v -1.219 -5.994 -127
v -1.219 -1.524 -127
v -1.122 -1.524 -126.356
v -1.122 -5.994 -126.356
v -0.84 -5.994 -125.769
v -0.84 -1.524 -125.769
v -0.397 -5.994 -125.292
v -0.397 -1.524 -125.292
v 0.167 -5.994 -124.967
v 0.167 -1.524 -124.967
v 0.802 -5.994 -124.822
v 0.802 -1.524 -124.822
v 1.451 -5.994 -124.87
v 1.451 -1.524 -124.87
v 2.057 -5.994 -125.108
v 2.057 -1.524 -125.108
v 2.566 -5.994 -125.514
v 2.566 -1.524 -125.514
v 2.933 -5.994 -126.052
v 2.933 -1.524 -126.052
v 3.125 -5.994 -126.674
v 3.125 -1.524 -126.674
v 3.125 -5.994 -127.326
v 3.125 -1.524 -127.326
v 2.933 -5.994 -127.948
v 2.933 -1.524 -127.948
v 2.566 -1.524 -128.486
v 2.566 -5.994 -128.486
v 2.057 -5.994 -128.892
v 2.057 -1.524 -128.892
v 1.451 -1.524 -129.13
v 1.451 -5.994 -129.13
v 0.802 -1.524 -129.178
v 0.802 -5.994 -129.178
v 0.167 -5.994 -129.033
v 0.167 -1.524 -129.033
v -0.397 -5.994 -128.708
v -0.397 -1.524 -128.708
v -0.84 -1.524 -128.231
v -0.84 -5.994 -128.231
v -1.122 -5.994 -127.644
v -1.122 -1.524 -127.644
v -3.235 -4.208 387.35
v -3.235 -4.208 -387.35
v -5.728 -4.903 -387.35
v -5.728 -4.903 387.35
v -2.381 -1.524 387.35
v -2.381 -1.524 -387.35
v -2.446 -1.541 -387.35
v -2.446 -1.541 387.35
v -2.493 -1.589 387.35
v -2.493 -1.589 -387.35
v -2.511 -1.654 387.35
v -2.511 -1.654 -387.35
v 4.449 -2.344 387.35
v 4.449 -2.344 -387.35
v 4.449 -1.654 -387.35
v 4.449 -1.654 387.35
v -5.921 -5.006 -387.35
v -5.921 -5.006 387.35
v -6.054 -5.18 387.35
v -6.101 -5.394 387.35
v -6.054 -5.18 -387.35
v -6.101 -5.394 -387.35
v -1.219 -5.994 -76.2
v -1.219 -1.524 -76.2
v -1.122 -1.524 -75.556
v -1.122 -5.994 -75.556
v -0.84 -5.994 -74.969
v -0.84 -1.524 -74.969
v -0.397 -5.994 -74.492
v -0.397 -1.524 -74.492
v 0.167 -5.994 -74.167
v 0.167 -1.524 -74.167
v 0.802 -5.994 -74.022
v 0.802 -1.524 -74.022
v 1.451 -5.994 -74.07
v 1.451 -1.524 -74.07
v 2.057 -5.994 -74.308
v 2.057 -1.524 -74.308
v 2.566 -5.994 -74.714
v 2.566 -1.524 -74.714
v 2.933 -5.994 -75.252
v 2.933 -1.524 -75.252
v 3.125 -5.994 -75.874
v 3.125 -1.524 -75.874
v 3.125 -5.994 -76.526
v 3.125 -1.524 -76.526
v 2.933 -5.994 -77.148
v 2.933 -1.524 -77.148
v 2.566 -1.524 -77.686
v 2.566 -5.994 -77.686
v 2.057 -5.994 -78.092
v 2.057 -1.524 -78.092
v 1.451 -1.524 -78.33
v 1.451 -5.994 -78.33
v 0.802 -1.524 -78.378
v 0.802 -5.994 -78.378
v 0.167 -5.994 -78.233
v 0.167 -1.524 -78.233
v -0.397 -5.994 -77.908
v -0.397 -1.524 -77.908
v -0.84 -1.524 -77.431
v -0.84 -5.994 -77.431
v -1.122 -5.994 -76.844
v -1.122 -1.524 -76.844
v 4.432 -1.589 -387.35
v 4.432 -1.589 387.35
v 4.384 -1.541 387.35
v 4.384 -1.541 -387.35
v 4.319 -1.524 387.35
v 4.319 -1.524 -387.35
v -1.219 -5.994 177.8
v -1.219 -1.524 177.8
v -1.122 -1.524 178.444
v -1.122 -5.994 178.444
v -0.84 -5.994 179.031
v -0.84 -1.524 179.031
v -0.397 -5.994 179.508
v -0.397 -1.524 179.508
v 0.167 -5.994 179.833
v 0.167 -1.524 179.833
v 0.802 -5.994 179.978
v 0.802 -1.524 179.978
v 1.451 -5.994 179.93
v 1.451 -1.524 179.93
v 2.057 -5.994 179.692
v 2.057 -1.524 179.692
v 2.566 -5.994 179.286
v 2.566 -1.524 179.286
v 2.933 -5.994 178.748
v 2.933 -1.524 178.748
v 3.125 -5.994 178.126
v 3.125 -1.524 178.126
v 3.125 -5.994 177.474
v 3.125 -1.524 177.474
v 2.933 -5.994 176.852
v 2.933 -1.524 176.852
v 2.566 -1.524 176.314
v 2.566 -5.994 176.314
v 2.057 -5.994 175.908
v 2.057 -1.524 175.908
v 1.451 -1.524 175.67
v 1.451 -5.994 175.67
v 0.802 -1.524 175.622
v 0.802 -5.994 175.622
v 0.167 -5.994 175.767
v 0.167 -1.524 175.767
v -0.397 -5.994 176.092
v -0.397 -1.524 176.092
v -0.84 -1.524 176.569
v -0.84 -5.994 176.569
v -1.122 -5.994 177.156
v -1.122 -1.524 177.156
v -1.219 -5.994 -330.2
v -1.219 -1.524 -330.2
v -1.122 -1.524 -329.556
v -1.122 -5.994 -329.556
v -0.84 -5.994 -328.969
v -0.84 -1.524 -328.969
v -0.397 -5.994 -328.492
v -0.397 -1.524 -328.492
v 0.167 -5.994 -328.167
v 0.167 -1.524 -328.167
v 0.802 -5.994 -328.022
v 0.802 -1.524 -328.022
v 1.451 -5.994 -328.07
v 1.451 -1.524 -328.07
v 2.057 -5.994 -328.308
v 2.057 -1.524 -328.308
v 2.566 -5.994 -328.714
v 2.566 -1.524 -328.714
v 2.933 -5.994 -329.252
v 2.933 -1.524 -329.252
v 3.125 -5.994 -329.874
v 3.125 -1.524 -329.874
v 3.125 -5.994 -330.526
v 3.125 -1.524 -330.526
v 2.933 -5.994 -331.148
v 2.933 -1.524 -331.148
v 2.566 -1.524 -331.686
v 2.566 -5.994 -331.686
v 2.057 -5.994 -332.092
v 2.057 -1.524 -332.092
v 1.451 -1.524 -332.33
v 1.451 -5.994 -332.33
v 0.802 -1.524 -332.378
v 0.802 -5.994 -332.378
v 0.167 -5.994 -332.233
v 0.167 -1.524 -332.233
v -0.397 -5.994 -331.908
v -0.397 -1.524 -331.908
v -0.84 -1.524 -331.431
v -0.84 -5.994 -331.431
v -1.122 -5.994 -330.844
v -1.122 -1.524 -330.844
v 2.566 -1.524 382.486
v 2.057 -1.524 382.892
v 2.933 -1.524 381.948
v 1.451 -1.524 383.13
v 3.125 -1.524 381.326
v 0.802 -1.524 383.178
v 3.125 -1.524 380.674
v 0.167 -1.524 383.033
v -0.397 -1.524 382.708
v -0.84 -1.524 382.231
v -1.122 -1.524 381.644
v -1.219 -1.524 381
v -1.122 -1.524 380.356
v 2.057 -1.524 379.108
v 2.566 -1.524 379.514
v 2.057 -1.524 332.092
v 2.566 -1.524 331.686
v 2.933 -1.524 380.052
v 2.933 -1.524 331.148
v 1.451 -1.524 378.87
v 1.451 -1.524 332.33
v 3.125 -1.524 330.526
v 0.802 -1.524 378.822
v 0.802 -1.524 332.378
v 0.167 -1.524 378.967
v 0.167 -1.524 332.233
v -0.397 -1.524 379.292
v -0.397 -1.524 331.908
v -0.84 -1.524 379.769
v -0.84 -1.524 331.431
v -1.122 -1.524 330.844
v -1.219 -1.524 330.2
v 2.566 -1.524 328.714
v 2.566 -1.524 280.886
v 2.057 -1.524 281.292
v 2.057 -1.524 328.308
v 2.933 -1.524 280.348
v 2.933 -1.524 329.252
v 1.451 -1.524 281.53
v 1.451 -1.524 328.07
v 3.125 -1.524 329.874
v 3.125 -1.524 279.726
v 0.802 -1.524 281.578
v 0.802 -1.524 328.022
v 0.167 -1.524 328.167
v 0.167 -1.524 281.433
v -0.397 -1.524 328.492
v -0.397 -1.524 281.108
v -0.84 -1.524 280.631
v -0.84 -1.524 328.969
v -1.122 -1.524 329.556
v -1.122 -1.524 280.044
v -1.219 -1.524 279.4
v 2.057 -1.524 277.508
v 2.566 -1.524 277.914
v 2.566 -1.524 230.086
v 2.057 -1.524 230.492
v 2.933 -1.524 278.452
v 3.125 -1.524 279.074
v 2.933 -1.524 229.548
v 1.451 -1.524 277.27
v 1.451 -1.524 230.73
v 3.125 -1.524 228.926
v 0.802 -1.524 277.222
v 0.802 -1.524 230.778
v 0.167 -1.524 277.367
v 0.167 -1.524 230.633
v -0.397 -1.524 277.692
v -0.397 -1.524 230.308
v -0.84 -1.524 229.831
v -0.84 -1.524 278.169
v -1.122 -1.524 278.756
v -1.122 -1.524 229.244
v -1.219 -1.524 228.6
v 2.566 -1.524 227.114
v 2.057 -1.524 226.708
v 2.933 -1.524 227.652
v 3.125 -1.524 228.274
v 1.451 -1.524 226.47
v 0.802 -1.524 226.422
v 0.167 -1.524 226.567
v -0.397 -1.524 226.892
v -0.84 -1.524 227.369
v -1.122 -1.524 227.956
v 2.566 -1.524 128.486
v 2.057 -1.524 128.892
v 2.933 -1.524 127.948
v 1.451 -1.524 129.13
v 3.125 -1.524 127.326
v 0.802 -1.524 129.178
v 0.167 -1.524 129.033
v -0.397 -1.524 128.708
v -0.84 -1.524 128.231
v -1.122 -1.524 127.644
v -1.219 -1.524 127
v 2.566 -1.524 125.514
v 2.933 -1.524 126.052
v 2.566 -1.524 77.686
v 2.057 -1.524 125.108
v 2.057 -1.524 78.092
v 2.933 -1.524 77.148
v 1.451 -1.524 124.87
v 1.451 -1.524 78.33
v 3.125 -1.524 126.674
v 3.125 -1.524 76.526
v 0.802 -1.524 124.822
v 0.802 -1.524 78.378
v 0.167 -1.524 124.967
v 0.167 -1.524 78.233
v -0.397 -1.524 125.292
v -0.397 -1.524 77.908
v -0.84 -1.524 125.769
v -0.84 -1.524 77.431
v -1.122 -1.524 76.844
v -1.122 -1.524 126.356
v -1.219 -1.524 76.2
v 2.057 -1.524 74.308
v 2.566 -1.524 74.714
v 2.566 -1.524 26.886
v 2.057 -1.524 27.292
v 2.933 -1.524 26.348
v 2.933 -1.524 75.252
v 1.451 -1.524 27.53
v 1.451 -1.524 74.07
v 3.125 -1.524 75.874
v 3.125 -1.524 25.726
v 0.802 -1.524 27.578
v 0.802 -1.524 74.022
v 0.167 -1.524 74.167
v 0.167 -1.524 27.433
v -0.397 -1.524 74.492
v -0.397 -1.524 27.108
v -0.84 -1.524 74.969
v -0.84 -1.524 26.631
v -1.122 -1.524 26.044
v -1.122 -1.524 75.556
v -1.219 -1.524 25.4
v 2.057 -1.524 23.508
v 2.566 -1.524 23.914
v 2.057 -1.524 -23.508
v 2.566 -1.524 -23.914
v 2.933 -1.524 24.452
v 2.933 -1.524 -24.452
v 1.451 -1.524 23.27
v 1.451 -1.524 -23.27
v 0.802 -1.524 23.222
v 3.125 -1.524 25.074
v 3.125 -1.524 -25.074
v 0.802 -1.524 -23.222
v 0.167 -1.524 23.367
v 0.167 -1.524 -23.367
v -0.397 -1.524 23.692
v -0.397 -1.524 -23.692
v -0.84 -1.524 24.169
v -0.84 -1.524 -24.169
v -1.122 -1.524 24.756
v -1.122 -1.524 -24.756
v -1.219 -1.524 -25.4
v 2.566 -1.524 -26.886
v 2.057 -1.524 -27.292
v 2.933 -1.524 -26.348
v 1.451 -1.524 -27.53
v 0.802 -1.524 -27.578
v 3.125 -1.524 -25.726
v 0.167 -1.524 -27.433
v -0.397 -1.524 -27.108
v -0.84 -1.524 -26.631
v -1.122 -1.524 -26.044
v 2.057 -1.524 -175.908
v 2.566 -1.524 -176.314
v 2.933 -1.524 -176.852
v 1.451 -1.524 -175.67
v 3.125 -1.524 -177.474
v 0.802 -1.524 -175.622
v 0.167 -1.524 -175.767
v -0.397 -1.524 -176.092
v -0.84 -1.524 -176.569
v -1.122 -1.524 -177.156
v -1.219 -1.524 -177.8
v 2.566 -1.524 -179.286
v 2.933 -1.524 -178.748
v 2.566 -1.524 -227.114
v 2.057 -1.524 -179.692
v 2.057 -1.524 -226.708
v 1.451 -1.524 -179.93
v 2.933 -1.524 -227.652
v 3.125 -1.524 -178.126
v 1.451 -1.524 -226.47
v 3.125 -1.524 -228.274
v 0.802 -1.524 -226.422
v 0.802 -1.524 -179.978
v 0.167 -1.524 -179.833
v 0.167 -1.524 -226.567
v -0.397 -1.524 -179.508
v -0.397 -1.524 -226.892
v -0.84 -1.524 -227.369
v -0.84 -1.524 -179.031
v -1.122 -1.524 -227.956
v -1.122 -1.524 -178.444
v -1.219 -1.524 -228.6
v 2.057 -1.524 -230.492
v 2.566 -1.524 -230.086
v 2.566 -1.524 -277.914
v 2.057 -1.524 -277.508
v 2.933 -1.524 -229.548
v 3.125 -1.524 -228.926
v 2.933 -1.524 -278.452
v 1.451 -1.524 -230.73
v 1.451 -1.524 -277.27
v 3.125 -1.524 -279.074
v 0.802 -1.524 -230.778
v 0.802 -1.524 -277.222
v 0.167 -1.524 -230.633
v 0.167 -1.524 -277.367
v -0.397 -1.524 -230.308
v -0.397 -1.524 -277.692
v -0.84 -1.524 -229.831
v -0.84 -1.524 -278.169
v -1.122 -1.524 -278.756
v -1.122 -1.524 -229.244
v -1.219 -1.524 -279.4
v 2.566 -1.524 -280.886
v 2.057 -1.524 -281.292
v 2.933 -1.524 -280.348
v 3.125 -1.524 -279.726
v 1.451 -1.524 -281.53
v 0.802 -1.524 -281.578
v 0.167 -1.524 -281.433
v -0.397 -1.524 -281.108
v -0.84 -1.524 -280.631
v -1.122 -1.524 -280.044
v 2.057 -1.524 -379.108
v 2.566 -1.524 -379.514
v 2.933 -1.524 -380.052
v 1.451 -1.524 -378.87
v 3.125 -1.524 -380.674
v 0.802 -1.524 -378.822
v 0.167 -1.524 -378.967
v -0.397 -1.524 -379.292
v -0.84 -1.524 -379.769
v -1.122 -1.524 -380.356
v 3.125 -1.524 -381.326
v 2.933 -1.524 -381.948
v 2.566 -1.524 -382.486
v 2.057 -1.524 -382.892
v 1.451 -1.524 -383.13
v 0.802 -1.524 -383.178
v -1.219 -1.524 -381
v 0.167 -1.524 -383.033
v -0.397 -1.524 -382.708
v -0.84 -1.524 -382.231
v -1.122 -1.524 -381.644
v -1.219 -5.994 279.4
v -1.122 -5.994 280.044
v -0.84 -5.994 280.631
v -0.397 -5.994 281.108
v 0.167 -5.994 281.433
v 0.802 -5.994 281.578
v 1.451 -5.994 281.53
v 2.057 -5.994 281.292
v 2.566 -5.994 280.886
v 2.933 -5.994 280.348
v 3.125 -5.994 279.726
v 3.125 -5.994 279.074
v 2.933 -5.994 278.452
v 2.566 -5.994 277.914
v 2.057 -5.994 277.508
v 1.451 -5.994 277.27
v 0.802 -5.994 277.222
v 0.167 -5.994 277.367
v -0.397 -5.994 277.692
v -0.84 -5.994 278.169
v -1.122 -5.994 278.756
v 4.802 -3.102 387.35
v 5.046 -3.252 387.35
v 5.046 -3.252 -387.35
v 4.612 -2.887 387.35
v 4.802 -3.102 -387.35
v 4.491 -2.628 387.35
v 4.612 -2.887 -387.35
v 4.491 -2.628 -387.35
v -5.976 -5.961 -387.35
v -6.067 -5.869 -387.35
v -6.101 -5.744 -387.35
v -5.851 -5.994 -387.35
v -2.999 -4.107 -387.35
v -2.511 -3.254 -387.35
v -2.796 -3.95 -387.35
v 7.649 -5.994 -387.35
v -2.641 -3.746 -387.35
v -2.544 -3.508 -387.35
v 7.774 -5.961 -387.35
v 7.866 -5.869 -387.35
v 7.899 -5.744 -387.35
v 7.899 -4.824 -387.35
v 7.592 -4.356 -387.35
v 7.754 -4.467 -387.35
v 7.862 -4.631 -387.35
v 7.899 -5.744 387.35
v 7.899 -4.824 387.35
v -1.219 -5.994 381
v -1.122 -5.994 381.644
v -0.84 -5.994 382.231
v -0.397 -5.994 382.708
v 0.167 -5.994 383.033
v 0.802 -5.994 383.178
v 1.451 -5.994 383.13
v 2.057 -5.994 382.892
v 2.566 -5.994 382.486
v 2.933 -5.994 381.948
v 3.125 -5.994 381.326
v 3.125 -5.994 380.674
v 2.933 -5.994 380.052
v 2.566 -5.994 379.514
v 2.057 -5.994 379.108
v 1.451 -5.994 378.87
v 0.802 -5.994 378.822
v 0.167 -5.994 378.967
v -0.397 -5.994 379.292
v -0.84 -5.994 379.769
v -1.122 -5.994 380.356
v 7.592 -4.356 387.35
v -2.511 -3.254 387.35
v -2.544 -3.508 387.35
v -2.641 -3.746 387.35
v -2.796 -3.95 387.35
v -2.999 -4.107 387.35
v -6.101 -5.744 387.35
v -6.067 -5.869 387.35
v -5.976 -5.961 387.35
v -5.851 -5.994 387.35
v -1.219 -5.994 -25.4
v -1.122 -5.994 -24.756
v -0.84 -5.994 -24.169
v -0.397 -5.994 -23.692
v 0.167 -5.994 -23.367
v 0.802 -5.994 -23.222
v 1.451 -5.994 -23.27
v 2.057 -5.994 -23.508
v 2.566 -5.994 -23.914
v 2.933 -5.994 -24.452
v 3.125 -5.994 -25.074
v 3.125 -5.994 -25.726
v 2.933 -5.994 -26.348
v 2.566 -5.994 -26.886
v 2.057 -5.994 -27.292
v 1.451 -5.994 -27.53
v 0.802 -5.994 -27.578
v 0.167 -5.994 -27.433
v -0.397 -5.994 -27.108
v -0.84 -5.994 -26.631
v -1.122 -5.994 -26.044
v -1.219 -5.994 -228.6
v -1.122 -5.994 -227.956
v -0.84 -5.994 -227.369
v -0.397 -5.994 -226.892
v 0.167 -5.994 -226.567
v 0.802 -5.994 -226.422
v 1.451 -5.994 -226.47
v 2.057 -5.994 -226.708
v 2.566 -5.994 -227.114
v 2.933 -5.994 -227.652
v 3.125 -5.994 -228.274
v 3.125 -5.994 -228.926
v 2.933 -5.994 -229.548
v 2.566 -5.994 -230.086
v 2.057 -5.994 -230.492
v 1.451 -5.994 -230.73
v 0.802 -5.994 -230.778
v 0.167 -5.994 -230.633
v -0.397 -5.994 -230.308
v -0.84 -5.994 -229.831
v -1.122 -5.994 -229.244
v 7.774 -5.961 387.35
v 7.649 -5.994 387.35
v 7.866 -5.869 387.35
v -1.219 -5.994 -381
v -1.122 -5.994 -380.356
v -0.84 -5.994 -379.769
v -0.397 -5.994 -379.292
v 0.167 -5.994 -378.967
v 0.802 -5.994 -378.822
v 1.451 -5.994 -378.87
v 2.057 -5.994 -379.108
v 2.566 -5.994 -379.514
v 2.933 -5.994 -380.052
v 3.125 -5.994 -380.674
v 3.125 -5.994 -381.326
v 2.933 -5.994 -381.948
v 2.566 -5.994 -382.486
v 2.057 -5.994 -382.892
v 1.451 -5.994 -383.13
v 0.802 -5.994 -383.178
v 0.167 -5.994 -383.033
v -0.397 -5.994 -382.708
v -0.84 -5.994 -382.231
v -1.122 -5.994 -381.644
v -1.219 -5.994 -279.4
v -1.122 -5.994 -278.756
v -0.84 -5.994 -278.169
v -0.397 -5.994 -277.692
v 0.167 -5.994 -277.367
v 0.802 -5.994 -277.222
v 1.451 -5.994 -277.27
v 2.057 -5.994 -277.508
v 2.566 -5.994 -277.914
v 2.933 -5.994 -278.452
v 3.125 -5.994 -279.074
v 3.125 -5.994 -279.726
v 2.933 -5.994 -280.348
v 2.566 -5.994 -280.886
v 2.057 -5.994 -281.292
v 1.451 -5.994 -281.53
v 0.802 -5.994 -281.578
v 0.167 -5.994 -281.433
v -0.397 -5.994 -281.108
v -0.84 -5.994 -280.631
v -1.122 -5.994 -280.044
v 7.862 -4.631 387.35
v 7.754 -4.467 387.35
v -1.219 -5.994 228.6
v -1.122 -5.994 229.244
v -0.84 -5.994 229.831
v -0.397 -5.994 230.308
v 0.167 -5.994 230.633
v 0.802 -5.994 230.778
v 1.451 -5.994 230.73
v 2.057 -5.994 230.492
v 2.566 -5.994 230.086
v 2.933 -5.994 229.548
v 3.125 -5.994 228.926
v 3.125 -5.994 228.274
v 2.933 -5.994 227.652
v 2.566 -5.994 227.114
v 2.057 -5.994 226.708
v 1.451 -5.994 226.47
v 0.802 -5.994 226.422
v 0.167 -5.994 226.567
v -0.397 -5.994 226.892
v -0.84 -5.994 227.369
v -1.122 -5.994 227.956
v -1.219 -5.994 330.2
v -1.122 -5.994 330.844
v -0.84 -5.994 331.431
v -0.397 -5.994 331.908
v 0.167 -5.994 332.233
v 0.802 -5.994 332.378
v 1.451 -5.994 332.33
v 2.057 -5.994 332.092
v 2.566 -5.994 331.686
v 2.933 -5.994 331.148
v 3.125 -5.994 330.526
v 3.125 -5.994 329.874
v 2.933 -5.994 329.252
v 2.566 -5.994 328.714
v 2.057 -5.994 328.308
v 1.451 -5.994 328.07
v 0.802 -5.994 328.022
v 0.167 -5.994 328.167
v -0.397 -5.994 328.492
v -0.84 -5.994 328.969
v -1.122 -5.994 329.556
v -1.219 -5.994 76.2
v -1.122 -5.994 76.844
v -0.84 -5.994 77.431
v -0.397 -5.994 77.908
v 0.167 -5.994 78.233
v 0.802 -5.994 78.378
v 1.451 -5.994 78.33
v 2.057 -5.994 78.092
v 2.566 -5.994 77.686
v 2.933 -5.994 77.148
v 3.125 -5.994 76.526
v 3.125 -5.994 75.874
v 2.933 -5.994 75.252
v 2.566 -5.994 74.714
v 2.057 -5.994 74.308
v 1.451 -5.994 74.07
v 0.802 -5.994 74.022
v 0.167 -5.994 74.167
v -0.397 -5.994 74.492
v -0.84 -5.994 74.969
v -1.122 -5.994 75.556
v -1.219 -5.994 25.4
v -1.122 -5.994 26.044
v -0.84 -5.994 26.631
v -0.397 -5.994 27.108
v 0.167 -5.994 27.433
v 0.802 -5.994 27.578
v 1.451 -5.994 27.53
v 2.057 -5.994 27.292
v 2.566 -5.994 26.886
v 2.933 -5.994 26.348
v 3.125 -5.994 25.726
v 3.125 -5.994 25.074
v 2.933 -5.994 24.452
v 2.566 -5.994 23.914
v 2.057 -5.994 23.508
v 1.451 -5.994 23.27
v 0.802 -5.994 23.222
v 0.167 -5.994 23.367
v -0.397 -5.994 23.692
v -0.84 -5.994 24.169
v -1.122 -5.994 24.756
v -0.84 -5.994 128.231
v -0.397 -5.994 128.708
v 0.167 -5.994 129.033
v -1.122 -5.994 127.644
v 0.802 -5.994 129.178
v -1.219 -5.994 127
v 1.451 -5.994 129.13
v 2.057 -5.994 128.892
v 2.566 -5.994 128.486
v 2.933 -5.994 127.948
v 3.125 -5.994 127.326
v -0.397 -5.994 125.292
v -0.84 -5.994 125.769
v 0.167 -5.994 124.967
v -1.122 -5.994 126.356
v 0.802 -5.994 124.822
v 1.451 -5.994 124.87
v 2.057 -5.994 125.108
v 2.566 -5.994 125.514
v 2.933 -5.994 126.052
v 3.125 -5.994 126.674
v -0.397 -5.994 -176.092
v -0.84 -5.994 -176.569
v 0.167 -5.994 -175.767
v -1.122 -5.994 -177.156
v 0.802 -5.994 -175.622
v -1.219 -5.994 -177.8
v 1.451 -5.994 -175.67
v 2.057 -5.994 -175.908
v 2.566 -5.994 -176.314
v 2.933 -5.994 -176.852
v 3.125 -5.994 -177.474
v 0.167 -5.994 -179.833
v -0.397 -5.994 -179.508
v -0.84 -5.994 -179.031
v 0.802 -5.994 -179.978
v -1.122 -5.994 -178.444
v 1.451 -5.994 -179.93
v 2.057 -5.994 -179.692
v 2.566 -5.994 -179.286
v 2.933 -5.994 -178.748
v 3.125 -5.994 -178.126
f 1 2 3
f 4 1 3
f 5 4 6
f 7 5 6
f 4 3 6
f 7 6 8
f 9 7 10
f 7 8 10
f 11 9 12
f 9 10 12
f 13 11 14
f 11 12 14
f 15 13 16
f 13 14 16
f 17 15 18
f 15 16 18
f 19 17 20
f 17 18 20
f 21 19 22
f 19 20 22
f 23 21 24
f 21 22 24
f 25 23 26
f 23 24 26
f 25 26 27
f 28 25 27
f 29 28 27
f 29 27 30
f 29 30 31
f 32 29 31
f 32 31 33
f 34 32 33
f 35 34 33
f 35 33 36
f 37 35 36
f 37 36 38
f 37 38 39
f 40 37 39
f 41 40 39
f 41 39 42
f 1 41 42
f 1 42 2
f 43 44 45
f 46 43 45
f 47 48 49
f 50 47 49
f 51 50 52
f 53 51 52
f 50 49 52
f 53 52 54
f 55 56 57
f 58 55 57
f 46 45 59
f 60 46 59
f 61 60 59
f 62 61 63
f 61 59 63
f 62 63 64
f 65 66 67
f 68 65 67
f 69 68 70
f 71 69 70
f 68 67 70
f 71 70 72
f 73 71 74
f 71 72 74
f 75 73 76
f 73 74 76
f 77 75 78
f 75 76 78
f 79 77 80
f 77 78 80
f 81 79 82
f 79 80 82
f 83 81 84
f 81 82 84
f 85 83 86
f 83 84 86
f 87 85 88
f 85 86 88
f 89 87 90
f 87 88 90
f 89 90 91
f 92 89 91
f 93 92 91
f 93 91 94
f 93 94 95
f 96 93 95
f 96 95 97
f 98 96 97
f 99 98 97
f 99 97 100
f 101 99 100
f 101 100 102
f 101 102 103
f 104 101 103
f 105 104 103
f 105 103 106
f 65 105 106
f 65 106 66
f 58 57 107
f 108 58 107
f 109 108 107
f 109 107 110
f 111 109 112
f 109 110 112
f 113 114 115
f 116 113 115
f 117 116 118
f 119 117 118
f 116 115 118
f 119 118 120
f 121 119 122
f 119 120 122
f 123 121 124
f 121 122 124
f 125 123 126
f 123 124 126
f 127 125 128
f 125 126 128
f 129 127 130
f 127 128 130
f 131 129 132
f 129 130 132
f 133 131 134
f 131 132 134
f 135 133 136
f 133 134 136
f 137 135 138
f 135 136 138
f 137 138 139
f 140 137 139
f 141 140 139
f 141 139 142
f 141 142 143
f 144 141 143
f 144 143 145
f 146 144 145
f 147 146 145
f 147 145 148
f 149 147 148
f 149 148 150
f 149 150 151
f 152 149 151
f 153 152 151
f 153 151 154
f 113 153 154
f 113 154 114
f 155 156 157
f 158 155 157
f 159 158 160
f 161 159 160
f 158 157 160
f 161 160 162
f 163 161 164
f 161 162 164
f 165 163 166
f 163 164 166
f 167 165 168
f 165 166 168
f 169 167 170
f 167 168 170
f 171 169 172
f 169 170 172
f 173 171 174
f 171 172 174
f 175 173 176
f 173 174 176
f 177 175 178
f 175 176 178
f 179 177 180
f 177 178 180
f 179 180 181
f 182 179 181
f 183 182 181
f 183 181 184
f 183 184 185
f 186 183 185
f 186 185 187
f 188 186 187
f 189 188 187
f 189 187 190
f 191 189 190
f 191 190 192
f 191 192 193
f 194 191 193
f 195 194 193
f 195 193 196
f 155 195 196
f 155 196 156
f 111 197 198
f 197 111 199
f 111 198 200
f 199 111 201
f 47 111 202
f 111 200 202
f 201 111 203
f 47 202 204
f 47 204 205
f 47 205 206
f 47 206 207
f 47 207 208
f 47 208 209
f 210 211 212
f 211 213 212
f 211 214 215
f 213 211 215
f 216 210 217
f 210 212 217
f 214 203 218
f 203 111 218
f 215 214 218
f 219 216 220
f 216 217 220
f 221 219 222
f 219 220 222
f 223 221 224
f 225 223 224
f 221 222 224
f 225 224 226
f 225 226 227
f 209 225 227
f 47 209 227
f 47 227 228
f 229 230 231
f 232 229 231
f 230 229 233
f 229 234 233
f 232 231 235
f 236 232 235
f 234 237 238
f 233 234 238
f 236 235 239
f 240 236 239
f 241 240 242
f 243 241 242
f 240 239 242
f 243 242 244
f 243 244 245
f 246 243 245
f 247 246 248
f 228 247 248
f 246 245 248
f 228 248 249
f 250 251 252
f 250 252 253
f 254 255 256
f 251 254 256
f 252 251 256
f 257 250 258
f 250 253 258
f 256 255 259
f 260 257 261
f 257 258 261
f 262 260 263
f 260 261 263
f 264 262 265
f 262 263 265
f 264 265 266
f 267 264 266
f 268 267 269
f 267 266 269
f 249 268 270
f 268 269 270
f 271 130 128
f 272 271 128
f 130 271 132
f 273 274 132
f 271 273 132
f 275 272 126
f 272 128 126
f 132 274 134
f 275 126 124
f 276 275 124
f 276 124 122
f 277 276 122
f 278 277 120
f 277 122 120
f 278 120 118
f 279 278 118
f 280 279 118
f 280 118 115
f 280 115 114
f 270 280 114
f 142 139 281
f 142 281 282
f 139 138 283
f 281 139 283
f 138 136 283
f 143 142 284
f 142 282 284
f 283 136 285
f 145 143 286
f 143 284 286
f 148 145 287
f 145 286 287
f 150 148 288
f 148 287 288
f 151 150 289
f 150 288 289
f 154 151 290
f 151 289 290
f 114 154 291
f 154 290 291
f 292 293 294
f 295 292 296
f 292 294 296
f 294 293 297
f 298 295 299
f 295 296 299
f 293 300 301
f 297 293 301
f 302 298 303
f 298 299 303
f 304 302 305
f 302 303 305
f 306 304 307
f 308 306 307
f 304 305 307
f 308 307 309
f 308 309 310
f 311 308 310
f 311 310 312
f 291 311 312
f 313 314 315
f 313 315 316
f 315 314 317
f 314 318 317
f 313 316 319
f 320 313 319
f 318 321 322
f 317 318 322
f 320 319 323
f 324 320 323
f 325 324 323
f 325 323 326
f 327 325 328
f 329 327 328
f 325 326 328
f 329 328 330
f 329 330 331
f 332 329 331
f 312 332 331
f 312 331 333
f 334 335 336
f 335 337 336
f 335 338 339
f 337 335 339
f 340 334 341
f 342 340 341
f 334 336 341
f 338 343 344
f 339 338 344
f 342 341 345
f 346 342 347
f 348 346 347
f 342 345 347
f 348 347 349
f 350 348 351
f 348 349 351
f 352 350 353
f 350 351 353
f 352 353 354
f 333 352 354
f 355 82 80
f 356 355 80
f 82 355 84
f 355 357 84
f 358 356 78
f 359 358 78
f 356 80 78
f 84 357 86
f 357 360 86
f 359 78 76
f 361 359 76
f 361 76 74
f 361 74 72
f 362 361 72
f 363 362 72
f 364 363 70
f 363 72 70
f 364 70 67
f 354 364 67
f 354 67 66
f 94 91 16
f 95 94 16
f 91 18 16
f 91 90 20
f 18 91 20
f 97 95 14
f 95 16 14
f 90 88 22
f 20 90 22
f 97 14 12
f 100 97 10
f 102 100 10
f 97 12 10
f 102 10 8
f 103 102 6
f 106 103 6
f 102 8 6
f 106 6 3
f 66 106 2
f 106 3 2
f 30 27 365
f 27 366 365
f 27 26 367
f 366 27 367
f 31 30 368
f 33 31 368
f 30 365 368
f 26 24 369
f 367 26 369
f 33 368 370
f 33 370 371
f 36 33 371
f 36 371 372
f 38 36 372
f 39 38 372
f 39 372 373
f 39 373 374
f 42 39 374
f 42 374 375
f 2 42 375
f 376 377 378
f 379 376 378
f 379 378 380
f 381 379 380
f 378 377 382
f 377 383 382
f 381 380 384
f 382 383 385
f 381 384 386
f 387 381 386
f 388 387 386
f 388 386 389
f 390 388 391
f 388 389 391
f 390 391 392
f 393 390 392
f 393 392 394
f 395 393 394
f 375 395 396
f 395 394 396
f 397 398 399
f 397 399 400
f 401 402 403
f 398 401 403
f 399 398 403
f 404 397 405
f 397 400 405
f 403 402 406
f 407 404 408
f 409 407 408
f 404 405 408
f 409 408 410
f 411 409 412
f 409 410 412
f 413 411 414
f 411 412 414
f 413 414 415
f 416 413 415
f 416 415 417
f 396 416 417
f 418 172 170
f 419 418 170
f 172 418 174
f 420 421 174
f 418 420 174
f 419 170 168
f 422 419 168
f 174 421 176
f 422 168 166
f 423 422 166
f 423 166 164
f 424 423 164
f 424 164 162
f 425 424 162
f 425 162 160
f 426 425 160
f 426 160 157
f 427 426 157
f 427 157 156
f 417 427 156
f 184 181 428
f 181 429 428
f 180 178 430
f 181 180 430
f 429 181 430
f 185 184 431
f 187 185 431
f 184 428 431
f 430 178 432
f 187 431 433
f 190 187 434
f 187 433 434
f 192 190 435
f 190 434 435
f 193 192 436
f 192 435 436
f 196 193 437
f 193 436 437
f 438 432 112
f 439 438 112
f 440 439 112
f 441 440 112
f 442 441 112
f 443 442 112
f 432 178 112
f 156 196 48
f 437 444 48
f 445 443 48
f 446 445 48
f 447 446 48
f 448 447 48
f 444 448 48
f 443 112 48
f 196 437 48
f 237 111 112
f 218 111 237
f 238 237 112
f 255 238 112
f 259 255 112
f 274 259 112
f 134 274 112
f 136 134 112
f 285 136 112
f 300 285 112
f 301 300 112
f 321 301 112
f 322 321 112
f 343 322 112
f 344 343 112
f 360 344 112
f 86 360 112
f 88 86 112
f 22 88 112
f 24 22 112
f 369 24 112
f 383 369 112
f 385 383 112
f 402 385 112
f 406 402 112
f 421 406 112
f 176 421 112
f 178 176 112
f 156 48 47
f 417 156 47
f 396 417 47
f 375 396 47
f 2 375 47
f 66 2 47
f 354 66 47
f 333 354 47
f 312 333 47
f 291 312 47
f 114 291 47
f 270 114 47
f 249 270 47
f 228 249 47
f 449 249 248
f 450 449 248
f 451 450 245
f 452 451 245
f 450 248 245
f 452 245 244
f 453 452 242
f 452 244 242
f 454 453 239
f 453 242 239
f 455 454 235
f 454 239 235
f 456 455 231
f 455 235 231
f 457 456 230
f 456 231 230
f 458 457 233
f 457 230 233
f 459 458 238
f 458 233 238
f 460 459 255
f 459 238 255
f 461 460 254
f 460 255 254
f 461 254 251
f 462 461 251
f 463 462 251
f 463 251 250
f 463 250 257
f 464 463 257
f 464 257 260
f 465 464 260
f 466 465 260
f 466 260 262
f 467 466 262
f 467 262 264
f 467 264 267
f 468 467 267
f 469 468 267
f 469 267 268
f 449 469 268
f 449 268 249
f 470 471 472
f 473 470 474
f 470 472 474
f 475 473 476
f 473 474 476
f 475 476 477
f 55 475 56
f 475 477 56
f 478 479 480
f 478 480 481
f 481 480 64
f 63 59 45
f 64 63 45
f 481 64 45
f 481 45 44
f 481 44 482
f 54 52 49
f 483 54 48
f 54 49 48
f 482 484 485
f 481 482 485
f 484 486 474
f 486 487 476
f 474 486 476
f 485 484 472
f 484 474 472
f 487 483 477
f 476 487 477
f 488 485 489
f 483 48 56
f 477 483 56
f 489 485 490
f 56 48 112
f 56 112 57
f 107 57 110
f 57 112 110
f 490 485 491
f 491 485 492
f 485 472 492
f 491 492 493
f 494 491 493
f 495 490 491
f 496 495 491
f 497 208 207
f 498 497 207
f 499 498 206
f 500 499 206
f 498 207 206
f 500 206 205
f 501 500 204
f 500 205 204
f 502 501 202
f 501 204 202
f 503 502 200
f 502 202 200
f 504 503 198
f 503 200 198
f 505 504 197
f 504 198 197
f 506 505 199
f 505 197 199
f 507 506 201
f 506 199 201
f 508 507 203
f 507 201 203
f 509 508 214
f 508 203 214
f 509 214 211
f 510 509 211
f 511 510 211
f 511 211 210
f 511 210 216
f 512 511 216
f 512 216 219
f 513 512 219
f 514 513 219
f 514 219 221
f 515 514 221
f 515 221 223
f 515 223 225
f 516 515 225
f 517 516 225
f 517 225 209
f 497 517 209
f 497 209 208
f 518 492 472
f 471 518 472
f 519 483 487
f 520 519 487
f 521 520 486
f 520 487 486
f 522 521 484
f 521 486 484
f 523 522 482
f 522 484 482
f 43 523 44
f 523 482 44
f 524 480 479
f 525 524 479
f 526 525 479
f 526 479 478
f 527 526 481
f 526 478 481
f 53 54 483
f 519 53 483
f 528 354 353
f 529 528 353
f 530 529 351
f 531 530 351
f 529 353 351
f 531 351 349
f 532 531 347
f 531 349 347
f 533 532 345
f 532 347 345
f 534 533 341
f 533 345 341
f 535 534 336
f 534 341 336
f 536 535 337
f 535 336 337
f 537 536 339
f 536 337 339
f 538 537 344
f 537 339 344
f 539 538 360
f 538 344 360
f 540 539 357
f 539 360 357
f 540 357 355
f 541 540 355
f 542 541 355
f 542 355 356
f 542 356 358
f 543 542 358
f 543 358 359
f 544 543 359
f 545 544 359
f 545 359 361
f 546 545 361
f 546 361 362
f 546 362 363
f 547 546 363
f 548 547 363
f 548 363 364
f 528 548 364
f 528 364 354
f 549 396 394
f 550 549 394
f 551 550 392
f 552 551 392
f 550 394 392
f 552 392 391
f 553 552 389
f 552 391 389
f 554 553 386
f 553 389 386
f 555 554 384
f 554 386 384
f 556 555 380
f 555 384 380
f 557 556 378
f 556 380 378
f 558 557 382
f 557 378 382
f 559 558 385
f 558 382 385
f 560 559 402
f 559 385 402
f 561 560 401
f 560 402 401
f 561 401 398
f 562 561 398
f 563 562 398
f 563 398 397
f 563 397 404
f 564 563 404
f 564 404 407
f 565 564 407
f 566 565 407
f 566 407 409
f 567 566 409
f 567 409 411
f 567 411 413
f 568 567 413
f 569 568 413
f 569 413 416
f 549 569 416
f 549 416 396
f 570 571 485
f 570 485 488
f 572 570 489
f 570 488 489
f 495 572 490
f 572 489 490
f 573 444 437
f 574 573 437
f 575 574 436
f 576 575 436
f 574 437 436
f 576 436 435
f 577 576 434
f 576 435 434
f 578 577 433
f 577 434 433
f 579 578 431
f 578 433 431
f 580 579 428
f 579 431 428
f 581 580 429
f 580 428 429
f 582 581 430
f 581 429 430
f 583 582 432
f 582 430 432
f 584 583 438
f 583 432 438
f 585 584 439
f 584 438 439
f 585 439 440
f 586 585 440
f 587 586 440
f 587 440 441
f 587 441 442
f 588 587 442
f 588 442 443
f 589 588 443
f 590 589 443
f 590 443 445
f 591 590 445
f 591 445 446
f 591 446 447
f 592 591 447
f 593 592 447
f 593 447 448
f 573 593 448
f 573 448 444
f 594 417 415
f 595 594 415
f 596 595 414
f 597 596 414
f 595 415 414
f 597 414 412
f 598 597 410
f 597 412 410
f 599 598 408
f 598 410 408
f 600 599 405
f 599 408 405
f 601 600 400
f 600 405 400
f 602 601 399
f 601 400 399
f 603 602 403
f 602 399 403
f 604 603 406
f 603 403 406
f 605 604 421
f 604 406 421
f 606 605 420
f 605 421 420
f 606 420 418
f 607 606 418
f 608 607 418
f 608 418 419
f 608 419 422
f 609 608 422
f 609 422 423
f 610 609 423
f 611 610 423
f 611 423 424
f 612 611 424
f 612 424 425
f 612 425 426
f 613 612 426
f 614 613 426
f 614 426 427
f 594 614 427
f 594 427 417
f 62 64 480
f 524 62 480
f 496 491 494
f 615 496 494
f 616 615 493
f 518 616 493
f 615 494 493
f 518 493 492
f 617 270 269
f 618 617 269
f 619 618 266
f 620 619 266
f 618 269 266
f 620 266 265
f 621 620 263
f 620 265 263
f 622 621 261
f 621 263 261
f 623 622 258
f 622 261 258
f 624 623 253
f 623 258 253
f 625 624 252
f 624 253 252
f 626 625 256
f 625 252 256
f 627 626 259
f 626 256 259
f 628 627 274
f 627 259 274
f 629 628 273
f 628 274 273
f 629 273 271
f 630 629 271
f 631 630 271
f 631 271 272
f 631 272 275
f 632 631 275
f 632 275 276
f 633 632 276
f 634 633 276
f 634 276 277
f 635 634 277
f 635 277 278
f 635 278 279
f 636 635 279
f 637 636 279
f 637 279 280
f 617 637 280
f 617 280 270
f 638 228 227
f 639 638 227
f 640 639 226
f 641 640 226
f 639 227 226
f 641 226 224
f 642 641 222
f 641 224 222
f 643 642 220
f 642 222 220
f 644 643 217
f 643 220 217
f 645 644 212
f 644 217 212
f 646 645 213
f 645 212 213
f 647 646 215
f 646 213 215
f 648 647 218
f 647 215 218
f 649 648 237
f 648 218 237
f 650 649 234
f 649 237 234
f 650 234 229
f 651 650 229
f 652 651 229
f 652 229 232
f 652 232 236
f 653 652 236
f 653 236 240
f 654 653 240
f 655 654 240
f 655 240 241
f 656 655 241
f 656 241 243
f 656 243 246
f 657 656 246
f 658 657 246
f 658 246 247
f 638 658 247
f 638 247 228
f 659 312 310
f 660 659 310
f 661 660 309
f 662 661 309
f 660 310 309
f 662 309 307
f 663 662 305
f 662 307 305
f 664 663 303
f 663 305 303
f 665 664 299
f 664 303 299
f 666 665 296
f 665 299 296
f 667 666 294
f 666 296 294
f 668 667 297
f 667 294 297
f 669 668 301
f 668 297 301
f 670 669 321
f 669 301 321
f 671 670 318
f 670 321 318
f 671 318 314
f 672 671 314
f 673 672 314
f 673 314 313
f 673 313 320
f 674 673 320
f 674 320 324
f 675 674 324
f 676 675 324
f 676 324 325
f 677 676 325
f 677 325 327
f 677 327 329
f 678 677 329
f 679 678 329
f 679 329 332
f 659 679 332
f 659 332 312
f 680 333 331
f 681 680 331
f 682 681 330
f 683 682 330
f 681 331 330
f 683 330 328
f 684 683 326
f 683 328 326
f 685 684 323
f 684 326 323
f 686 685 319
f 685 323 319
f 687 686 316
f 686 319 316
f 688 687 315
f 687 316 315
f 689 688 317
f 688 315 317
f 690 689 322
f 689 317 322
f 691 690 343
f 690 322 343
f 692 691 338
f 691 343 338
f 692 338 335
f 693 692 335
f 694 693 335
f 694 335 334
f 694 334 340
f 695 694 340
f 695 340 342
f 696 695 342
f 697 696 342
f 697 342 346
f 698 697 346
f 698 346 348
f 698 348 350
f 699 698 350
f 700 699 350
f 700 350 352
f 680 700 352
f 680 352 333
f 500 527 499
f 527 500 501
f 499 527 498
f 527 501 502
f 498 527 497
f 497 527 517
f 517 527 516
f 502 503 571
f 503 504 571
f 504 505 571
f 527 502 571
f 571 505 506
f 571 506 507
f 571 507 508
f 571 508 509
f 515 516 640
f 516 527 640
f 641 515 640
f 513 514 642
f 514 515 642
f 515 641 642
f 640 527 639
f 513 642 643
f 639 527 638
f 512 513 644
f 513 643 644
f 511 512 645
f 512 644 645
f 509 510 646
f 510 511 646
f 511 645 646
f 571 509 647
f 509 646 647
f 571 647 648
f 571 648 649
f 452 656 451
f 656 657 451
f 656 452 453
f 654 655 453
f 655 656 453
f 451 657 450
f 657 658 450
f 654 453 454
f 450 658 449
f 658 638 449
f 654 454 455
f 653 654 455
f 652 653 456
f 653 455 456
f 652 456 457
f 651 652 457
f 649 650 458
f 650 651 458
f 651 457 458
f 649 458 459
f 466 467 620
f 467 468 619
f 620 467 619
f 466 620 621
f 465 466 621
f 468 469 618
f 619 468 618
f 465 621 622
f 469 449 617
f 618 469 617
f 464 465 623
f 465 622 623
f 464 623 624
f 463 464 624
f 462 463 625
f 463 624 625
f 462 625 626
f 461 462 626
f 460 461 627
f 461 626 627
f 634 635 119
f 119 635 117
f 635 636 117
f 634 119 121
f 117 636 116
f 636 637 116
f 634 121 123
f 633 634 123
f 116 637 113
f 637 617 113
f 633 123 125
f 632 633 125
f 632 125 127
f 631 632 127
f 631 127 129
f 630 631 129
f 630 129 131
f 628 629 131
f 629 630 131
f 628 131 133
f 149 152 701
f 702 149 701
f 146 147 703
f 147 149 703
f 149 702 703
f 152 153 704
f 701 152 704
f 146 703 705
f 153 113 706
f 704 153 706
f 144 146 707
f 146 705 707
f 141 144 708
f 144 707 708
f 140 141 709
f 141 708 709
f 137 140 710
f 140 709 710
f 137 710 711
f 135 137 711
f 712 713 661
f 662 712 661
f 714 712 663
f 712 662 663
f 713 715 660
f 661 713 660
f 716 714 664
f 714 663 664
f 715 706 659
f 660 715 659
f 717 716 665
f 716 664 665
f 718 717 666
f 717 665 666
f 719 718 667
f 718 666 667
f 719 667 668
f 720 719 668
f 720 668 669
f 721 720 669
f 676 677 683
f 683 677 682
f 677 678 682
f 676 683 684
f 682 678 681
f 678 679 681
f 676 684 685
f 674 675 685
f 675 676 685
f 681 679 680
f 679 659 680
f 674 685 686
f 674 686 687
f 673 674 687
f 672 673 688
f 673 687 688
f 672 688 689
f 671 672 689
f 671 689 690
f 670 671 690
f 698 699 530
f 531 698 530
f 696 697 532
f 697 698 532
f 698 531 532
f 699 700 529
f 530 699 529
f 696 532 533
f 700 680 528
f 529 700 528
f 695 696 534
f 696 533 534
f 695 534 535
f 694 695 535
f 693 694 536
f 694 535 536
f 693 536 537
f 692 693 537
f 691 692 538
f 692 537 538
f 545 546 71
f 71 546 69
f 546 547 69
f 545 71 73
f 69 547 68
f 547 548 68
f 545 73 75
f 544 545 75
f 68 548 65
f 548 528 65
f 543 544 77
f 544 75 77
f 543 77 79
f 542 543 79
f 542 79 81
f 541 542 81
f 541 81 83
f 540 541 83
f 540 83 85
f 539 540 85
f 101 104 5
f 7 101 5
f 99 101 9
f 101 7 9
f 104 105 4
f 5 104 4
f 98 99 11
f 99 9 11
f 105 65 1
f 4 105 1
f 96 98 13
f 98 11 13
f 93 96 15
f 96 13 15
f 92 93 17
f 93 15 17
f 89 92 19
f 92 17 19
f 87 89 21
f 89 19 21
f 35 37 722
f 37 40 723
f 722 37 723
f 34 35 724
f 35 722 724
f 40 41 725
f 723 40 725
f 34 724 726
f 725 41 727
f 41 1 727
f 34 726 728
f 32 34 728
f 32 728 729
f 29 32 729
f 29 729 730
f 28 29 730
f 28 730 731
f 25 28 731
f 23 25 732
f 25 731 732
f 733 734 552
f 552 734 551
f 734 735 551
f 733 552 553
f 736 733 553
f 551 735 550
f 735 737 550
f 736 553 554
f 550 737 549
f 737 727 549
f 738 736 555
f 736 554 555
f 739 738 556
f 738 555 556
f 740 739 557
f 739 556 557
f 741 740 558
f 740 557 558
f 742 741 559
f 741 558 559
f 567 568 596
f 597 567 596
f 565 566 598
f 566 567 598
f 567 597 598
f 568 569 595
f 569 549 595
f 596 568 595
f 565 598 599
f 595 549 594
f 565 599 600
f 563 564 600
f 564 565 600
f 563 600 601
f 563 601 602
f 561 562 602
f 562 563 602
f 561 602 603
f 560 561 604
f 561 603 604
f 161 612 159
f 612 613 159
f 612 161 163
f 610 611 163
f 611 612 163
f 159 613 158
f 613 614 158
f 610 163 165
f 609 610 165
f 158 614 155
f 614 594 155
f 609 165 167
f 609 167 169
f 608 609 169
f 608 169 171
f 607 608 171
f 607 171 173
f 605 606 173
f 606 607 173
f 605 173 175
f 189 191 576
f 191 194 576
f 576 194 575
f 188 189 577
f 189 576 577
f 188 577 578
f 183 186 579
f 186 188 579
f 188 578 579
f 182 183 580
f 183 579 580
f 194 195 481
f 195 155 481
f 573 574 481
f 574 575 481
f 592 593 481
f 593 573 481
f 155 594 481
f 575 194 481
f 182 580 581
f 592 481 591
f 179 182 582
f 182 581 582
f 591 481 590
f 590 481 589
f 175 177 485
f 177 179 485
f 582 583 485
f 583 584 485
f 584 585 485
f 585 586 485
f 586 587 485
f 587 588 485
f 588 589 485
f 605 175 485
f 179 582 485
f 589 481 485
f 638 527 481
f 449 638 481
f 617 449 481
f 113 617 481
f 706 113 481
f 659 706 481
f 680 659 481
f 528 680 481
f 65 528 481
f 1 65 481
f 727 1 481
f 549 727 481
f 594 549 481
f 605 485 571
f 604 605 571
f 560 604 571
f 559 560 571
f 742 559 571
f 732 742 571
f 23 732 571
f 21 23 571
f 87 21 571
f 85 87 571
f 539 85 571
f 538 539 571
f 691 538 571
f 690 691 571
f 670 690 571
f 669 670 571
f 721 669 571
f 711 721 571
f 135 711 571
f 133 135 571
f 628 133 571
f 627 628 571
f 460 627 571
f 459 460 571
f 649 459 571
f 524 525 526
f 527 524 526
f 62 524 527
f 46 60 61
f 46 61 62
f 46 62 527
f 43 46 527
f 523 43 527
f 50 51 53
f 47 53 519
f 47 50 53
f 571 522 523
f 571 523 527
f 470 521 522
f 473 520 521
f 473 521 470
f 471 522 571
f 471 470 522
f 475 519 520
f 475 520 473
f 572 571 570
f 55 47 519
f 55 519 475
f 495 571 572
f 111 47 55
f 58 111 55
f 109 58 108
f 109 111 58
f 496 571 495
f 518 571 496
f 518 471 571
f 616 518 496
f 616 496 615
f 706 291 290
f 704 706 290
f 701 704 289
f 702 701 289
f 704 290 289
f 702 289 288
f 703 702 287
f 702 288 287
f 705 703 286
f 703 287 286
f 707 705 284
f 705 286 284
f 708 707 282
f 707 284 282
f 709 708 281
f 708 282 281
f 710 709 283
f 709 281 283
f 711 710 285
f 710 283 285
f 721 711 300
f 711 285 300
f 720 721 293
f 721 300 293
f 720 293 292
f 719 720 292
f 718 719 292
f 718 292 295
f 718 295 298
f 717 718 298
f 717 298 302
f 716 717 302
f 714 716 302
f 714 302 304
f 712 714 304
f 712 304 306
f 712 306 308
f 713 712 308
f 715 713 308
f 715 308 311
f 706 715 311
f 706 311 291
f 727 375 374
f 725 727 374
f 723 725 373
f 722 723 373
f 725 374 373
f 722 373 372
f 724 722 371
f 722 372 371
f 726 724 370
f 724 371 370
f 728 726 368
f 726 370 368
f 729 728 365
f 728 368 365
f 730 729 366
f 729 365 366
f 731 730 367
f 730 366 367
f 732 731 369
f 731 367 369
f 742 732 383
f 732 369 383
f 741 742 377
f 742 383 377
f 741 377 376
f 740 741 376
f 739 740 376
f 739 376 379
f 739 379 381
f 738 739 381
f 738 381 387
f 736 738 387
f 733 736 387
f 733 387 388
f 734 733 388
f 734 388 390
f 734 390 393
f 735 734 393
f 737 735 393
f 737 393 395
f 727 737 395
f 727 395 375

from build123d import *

# Parameters (mm, degrees)
BOSS_EXTRUDE1_START = -387.35
BOSS_EXTRUDE1_DEPTH = 774.7
SKETCH2_R           = 2.1844
CUT_EXTRUDE1_DEPTH  = 388.45632518
LPATTERN1_COUNT     = 16
LPATTERN1_PITCH     = 50.8


# Read off the part's stored shape, not the designer's step: Boss-Extrude1
with BuildPart() as part:
    # Boss-Extrude1 outline → Boss-Extrude1 (new body)
    with BuildSketch(Plane.XY.offset(BOSS_EXTRUDE1_START)):
        with BuildLine():
            Line((7.592213731, -4.356061452), (5.045702304, -3.252351569))
            ThreePointArc((5.045702304, -3.252351569), (4.611794645, -2.88729515), (4.449399788, -2.34399969))
            Line((4.449399788, -2.34399969), (4.449399788, -1.654000019))
            ThreePointArc((4.449399788, -1.654000019), (4.411323664, -1.562076124), (4.319399769, -1.524))
            Line((4.319399769, -1.524), (-2.380600243, -1.524))
            ThreePointArc((-2.380600243, -1.524), (-2.472524138, -1.562076124), (-2.510600262, -1.654000019))
            Line((-2.510600262, -1.654000019), (-2.510600262, -3.254000076))
            ThreePointArc((-2.510600262, -3.254000076), (-2.712136776, -3.852686425), (-3.234691843, -4.207620945))
            Line((-3.234691843, -4.207620945), (-5.727583947, -4.902741098))
            ThreePointArc((-5.727583947, -4.902741098), (-5.996778712, -5.08558597), (-6.100600448, -5.393999841))
            Line((-6.100600448, -5.393999841), (-6.100600448, -5.743999967))
            ThreePointArc((-6.100600448, -5.743999967), (-6.027377074, -5.92077683), (-5.850600211, -5.994000204))
            Line((-5.850600211, -5.994000204), (7.649399763, -5.994000204))
            ThreePointArc((7.649399763, -5.994000204), (7.826176626, -5.92077683), (7.8994, -5.743999967))
            Line((7.8994, -5.743999967), (7.8994, -4.824000488))
            ThreePointArc((7.8994, -4.824000488), (7.81574201, -4.544120895), (7.592213731, -4.356061452))
        make_face()
    extrude(amount=BOSS_EXTRUDE1_DEPTH)

    # Sketch2 → Cut-Extrude1 (cut, through all)
    with BuildSketch(Plane(origin=(0, -1.524, 0), x_dir=(1, 0, 0), z_dir=(0, 1, 0))):
        with Locations(Location((0.9652, -381, 0), (0, 0, 180))):
            Circle(SKETCH2_R)
    cut_extrude1 = extrude(amount=-CUT_EXTRUDE1_DEPTH, mode=Mode.SUBTRACT)

    # LPattern1: Cut-Extrude1 ×16
    with Locations(*[(0, 0, -i * LPATTERN1_PITCH) for i in range(1, LPATTERN1_COUNT)]):
        add(cut_extrude1, mode=Mode.SUBTRACT)


solid = part.part
